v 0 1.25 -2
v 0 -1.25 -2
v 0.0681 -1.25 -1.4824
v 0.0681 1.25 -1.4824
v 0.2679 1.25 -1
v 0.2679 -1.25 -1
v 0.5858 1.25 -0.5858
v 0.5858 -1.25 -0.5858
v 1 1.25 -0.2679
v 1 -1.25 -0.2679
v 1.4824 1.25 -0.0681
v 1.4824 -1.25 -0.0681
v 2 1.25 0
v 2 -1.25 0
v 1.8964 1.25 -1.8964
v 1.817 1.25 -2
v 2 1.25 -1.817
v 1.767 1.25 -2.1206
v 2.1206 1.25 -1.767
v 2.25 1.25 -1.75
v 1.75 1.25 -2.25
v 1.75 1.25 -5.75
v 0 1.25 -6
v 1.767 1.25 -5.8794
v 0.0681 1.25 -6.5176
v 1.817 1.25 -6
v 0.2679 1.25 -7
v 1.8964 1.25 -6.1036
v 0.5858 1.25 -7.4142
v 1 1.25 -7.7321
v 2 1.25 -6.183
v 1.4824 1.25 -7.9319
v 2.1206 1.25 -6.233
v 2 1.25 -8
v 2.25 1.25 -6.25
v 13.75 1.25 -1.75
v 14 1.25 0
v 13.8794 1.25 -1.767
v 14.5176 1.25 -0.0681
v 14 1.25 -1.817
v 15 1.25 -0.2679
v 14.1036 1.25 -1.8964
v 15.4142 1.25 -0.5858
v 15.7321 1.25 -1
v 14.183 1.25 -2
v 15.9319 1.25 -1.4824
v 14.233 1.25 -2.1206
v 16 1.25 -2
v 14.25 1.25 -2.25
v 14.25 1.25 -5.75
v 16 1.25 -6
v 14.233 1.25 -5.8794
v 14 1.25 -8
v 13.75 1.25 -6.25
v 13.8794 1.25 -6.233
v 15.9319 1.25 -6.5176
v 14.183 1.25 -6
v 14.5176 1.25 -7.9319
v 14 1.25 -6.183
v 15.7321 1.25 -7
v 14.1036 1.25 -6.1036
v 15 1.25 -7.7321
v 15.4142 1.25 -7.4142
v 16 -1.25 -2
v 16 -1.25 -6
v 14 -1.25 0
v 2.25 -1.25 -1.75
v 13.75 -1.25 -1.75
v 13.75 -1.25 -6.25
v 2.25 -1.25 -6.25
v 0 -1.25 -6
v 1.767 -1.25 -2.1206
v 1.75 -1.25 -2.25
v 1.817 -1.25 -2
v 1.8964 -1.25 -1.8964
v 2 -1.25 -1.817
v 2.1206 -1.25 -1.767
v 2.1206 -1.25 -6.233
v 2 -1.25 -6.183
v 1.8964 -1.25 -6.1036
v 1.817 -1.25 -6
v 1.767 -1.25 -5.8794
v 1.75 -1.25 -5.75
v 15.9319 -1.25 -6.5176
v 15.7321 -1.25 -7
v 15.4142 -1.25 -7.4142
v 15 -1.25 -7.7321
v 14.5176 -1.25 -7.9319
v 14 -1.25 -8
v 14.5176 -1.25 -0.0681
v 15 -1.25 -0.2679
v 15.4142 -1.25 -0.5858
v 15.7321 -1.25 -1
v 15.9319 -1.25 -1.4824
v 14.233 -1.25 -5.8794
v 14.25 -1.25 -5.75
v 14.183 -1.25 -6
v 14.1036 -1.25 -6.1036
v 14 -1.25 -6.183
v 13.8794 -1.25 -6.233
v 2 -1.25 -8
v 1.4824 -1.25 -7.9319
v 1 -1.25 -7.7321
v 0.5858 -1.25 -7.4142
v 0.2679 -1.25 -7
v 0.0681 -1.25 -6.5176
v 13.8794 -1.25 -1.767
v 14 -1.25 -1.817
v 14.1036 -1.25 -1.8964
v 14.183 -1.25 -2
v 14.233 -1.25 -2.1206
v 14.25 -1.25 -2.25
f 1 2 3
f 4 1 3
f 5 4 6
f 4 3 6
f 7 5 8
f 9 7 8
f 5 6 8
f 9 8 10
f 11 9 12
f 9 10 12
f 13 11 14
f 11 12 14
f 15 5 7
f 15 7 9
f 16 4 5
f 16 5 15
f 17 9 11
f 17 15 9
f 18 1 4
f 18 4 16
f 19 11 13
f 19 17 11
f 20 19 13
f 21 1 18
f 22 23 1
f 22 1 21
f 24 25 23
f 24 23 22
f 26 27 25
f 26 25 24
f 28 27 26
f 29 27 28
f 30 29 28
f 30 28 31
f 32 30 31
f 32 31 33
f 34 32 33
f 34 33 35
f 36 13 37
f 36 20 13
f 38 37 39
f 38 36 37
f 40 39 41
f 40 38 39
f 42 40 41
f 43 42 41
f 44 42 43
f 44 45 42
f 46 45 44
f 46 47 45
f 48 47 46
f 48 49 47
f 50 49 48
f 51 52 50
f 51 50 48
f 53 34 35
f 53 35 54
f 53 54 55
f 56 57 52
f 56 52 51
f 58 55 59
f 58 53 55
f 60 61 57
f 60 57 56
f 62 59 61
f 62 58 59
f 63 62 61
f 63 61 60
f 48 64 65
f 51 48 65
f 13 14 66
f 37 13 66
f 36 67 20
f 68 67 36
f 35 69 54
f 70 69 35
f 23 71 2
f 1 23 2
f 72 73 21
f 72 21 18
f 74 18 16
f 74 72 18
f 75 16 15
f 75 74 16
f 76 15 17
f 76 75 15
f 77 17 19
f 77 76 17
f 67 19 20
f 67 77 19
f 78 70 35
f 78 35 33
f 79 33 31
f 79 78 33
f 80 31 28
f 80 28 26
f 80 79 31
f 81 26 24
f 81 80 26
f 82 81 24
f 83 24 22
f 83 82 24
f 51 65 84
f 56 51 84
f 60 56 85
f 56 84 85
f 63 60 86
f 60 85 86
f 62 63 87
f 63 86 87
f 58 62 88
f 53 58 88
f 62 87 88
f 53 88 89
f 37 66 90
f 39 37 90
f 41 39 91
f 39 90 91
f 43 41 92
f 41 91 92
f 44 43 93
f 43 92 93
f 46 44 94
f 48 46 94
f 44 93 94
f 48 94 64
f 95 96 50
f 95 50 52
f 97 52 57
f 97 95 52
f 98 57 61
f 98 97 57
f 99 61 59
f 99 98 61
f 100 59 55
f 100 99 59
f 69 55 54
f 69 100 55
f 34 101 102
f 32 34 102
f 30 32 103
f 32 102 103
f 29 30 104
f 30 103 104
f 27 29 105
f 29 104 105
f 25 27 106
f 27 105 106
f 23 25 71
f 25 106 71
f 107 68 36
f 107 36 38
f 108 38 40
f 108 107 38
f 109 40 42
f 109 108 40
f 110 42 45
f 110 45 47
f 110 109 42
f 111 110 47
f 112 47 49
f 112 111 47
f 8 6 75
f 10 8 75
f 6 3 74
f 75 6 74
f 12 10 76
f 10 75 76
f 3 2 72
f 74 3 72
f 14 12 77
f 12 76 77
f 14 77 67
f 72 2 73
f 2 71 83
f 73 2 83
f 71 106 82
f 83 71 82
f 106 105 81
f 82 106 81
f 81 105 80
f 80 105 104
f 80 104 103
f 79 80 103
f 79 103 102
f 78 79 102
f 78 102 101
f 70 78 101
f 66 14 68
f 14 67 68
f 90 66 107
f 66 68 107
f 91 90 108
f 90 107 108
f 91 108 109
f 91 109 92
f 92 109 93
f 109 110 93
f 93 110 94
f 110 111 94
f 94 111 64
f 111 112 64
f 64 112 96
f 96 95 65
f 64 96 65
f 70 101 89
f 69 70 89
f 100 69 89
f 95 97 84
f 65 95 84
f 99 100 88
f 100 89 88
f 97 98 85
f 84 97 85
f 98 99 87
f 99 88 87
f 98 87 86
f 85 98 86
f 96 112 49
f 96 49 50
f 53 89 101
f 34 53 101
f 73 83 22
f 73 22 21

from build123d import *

# Parameters (mm, degrees)
SALIENTE_EXTRUIR2_DEPTH      = 1.25
SALIENTE_EXTRUIR2_DEPTH_BACK = 1.25


with BuildPart() as part:
    # Croquis1 → Saliente-Extruir2 (new, two sides: drawn at the far end of the back side and taken through both)
    with BuildSketch(Plane(origin=(0, 0, 0), x_dir=(1, 0, 0), z_dir=(0, 1, 0)).offset(-SALIENTE_EXTRUIR2_DEPTH_BACK)):
        with BuildLine():
            Line((2, 0), (14, 0))
            ThreePointArc((14, 0), (15.414213562, 0.585786438), (16, 2))
            Line((16, 2), (16, 6))
            ThreePointArc((16, 6), (15.414213562, 7.414213562), (14, 8))
            Line((14, 8), (2, 8))
            ThreePointArc((2, 8), (0.585786438, 7.414213562), (0, 6))
            Line((0, 6), (0, 2))
            ThreePointArc((0, 2), (0.585786438, 0.585786438), (2, 0))
        make_face()
        with BuildLine():
            Line((1.75, 5.75), (1.75, 2.25))
            ThreePointArc((1.75, 2.25), (1.896446609, 1.896446609), (2.25, 1.75))
            Line((2.25, 1.75), (13.75, 1.75))
            ThreePointArc((13.75, 1.75), (14.103553391, 1.896446609), (14.25, 2.25))
            Line((14.25, 2.25), (14.25, 5.75))
            ThreePointArc((14.25, 5.75), (14.103553391, 6.103553391), (13.75, 6.25))
            Line((13.75, 6.25), (2.25, 6.25))
            ThreePointArc((2.25, 6.25), (1.896446609, 6.103553391), (1.75, 5.75))
        make_face(mode=Mode.SUBTRACT)
    extrude(amount=SALIENTE_EXTRUIR2_DEPTH + SALIENTE_EXTRUIR2_DEPTH_BACK)


solid = part.part
